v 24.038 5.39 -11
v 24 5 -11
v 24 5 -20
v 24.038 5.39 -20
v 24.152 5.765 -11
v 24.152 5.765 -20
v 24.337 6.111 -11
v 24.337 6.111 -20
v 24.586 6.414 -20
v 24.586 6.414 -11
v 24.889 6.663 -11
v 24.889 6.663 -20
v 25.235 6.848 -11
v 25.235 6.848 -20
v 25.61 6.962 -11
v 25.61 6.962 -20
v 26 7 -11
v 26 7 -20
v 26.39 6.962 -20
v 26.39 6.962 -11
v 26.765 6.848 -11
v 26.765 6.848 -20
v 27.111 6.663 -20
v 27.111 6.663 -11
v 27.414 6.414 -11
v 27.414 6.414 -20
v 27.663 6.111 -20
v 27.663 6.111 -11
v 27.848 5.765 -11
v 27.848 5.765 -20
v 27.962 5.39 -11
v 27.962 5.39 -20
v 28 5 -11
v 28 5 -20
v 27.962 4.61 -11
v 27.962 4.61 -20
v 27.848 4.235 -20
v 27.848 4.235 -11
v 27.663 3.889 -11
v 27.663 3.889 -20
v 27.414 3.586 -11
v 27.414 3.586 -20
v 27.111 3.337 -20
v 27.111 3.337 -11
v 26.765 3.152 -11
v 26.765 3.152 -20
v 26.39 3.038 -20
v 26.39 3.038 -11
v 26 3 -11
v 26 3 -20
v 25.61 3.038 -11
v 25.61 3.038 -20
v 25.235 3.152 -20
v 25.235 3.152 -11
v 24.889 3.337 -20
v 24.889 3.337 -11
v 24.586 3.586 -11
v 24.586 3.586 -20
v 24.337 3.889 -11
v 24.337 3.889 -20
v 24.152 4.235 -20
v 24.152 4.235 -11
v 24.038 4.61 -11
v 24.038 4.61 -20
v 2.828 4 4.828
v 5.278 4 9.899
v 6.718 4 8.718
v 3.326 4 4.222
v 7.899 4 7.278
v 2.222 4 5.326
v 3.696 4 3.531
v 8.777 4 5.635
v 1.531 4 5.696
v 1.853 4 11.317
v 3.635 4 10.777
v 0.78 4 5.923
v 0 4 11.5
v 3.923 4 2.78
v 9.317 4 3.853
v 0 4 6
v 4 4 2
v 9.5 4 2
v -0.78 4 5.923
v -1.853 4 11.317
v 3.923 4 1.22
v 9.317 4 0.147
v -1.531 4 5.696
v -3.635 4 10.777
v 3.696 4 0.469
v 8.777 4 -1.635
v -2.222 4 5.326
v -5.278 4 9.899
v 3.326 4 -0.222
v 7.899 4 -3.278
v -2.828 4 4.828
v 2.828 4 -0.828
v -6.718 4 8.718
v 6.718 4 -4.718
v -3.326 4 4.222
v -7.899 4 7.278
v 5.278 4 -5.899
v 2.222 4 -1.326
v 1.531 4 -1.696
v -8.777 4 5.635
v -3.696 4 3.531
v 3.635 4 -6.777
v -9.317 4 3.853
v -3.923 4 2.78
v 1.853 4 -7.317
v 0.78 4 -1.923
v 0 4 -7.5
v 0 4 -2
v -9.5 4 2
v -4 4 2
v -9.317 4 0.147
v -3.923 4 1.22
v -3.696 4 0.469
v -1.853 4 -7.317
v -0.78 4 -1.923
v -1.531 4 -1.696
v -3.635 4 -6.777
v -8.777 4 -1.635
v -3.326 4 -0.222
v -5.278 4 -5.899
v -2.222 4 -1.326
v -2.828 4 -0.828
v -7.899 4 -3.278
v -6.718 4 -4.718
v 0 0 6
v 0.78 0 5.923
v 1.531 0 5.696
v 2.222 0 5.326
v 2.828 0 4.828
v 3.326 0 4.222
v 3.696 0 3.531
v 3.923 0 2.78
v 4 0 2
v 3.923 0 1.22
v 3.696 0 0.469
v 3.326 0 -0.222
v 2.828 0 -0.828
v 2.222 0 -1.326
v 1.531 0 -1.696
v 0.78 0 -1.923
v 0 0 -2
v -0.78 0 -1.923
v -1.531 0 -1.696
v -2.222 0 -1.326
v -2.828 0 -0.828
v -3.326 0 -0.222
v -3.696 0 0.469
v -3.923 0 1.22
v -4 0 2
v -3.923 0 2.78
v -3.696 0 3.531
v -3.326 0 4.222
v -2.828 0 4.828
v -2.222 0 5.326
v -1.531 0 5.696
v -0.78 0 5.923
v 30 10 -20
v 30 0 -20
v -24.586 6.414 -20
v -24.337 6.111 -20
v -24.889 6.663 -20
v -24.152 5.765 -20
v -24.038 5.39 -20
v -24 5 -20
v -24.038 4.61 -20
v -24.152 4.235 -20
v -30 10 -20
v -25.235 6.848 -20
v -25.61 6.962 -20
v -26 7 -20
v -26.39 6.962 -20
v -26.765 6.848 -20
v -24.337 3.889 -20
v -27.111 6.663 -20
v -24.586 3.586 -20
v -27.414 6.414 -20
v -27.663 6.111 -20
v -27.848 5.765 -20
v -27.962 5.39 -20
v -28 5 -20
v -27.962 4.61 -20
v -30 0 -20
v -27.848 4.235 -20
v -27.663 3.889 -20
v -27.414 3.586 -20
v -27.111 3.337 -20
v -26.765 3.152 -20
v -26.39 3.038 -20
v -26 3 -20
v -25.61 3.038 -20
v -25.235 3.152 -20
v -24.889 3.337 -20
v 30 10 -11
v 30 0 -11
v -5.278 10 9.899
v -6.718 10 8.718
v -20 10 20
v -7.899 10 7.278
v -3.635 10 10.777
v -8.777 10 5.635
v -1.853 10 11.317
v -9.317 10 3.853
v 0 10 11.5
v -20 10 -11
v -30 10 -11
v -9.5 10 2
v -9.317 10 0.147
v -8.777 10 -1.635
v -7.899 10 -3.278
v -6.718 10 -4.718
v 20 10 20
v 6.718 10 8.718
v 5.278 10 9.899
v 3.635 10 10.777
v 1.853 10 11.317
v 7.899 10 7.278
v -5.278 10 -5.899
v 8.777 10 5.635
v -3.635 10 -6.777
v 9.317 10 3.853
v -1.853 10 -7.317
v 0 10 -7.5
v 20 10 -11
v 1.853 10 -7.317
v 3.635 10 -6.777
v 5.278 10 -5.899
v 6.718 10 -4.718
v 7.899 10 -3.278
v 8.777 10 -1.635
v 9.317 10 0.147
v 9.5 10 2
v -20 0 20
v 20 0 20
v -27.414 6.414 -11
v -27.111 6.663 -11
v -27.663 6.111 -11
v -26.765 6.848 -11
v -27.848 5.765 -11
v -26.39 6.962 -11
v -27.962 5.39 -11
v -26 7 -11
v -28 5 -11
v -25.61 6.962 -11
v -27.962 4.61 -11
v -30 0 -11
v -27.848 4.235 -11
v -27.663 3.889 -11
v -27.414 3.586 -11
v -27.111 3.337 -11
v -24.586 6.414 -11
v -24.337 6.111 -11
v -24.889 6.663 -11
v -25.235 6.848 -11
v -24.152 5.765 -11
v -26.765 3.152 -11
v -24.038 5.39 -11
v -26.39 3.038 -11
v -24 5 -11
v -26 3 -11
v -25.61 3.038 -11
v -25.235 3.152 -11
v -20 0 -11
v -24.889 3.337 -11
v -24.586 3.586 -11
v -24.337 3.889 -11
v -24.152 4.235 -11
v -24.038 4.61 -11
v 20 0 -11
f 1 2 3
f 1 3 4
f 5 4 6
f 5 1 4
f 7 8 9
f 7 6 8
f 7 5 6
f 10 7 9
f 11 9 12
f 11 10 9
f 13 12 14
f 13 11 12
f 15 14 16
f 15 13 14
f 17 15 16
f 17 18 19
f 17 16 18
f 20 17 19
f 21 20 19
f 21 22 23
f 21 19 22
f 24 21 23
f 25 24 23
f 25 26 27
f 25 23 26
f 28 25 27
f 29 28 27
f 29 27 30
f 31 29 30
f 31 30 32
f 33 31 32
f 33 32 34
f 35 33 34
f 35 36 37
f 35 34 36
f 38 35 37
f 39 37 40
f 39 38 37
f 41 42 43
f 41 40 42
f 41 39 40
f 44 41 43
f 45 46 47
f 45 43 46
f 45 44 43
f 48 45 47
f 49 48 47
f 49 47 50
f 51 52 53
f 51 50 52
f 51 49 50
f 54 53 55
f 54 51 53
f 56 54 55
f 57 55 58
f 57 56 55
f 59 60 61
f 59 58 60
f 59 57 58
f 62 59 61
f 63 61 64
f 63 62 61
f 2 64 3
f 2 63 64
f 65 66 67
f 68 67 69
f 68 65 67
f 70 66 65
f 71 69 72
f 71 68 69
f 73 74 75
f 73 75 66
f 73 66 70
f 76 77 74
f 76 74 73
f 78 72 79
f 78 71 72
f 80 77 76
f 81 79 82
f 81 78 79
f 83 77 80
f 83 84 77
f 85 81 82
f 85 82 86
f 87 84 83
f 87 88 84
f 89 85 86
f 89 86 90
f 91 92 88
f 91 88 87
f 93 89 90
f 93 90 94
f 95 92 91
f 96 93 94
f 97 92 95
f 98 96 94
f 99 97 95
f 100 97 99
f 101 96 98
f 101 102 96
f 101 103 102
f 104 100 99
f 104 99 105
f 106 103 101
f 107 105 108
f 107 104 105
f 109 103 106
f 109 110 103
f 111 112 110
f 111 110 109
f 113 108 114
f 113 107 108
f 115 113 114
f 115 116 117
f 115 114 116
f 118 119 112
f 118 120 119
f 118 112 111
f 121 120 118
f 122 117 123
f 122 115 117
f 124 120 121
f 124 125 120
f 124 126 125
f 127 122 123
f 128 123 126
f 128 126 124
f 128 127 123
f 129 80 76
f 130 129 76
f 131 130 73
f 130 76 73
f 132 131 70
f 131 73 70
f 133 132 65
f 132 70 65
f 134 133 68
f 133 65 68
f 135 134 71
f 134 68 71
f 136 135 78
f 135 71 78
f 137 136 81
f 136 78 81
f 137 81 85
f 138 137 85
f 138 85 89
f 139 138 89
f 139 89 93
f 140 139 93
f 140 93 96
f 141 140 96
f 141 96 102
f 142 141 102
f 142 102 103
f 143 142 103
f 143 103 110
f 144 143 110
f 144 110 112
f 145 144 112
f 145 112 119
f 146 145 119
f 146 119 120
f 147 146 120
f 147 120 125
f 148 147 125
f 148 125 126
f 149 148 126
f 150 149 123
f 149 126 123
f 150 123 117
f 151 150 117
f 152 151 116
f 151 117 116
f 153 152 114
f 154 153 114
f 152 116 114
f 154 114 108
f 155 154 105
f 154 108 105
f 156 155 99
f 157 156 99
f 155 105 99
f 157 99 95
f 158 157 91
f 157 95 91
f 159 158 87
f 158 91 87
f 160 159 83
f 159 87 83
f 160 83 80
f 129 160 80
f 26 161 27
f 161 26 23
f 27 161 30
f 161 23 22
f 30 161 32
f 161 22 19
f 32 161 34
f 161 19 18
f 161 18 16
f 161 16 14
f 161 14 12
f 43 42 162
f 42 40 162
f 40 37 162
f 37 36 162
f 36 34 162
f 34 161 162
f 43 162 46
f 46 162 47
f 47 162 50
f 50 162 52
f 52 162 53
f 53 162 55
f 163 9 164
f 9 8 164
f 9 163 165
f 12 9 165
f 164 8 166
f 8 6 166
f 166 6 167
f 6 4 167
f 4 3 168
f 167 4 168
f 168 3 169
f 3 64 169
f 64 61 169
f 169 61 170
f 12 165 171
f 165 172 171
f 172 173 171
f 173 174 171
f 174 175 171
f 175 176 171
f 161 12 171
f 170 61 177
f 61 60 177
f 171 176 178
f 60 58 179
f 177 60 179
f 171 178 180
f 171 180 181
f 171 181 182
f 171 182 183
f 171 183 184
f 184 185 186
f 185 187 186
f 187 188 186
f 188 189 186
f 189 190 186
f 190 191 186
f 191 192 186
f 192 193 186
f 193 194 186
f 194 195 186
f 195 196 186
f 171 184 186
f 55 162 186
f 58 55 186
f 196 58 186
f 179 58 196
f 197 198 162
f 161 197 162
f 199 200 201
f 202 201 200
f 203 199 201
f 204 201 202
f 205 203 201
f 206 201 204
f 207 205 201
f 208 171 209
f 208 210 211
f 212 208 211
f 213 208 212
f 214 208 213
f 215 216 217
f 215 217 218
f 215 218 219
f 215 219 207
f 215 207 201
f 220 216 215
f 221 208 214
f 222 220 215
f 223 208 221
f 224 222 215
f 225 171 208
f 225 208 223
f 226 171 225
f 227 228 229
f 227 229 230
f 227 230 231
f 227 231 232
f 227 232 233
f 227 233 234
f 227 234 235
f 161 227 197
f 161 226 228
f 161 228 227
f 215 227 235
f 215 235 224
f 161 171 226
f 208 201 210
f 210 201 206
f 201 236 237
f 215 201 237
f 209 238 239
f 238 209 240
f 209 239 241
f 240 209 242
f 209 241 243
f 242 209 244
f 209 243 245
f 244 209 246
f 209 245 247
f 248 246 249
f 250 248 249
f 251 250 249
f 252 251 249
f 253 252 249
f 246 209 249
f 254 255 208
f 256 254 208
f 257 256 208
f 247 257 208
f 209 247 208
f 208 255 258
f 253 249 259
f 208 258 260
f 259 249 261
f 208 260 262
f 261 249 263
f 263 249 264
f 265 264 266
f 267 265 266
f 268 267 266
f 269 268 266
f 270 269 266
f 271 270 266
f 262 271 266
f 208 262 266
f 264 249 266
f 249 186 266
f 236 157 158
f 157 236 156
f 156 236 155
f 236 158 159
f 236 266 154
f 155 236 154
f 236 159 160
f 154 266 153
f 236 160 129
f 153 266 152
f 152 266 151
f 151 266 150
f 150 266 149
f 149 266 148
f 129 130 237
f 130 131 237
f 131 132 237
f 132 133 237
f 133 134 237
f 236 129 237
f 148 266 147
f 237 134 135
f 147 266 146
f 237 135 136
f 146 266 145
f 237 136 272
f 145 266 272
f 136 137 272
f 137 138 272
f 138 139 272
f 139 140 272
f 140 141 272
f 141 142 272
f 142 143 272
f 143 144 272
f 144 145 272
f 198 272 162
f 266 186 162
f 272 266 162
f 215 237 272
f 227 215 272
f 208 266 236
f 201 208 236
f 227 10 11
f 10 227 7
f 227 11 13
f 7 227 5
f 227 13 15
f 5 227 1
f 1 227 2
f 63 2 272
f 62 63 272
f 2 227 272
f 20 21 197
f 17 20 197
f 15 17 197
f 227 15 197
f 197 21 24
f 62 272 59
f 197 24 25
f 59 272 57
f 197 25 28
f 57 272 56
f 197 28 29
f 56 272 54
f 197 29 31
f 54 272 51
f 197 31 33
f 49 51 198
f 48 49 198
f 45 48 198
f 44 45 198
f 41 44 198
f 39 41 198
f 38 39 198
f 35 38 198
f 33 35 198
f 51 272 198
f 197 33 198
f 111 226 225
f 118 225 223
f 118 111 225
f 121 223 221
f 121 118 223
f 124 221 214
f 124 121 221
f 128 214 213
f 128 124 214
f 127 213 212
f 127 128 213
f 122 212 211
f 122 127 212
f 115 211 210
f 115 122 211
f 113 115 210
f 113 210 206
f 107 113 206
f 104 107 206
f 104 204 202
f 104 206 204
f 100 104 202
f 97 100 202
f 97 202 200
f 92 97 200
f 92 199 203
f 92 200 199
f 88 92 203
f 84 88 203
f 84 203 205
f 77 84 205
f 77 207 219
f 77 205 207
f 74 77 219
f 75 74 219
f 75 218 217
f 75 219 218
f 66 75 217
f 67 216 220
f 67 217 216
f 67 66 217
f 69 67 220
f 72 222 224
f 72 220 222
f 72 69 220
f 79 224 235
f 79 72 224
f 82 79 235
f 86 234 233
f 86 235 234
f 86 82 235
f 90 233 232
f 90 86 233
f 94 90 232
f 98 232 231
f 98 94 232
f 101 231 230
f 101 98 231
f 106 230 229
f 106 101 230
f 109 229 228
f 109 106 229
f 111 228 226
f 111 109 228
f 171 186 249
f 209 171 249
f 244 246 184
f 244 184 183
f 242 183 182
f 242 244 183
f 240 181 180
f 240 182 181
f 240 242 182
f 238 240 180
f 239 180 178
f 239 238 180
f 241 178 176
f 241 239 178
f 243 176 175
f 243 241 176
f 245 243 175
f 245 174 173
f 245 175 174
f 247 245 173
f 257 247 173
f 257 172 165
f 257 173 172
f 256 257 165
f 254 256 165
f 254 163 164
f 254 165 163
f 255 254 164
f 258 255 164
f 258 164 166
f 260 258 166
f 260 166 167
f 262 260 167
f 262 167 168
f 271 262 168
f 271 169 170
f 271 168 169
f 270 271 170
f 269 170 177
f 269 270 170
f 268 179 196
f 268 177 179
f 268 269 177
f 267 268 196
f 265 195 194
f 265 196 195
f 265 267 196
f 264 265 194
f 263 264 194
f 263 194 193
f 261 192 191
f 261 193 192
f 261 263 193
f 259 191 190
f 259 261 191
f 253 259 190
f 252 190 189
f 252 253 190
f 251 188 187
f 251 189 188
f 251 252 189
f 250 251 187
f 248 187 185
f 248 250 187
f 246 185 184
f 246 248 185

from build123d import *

# Parameters (mm, degrees)
BOSS_EXTRUDE1_DEPTH     = 10
CUT_EXTRUDE1_DEPTH      = 38.416573868
CUT_EXTRUDE1_DEPTH_BACK = 6
SKETCH3_R               = 9.5
SKETCH4_R               = 4
CUT_EXTRUDE2_DEPTH      = 10
CUT_EXTRUDE3_DEPTH      = 51.990195136
CUT_EXTRUDE3_DEPTH_BACK = 51.990195136
SKETCH5_R               = 2


with BuildPart() as part:
    # Sketch1 → Boss-Extrude1 (new body)
    with BuildSketch(Plane(origin=(0, 0, 0), x_dir=(1, 0, 0), z_dir=(0, 1, 0))):
        Polygon((-20, -20), (20, -20), (20, 11), (30, 11), (30, 20), (20, 20), (-20, 20), (-30, 20), (-30, 11), (-20, 11), align=None)
    extrude(amount=BOSS_EXTRUDE1_DEPTH)

    # Sketch3 → Cut-Extrude1 (cut, two sides: drawn at the far end of the back side and taken through both)
    with BuildSketch(Plane(origin=(0, 10, 0), x_dir=(1, 0, 0), z_dir=(0, 1, 0)).offset(-CUT_EXTRUDE1_DEPTH_BACK)):
        with Locations(Location((0, -2, 0), (0, 0, 90))):
            Circle(SKETCH3_R)
    extrude(amount=CUT_EXTRUDE1_DEPTH + CUT_EXTRUDE1_DEPTH_BACK, mode=Mode.SUBTRACT)

    # Sketch4 → Cut-Extrude2 (cut)
    with BuildSketch(Plane(origin=(0, 4, 0), x_dir=(1, 0, 0), z_dir=(0, 1, 0))):
        with Locations(Location((0, -2, 0), (0, 0, 270))):
            Circle(SKETCH4_R)
    extrude(amount=-CUT_EXTRUDE2_DEPTH, mode=Mode.SUBTRACT)

    # Sketch5 → Cut-Extrude3 (cut, two sides: drawn at the far end of the back side and taken through both)
    with BuildSketch(Plane(origin=(0, 0, -20), x_dir=(-1, 0, 0), z_dir=(0, 0, -1)).offset(-CUT_EXTRUDE3_DEPTH_BACK)):
        with Locations((-26, 5)):
            Circle(SKETCH5_R)
        with Locations((26, 5)):
            Circle(SKETCH5_R)
    extrude(amount=CUT_EXTRUDE3_DEPTH + CUT_EXTRUDE3_DEPTH_BACK, mode=Mode.SUBTRACT)


solid = part.part
